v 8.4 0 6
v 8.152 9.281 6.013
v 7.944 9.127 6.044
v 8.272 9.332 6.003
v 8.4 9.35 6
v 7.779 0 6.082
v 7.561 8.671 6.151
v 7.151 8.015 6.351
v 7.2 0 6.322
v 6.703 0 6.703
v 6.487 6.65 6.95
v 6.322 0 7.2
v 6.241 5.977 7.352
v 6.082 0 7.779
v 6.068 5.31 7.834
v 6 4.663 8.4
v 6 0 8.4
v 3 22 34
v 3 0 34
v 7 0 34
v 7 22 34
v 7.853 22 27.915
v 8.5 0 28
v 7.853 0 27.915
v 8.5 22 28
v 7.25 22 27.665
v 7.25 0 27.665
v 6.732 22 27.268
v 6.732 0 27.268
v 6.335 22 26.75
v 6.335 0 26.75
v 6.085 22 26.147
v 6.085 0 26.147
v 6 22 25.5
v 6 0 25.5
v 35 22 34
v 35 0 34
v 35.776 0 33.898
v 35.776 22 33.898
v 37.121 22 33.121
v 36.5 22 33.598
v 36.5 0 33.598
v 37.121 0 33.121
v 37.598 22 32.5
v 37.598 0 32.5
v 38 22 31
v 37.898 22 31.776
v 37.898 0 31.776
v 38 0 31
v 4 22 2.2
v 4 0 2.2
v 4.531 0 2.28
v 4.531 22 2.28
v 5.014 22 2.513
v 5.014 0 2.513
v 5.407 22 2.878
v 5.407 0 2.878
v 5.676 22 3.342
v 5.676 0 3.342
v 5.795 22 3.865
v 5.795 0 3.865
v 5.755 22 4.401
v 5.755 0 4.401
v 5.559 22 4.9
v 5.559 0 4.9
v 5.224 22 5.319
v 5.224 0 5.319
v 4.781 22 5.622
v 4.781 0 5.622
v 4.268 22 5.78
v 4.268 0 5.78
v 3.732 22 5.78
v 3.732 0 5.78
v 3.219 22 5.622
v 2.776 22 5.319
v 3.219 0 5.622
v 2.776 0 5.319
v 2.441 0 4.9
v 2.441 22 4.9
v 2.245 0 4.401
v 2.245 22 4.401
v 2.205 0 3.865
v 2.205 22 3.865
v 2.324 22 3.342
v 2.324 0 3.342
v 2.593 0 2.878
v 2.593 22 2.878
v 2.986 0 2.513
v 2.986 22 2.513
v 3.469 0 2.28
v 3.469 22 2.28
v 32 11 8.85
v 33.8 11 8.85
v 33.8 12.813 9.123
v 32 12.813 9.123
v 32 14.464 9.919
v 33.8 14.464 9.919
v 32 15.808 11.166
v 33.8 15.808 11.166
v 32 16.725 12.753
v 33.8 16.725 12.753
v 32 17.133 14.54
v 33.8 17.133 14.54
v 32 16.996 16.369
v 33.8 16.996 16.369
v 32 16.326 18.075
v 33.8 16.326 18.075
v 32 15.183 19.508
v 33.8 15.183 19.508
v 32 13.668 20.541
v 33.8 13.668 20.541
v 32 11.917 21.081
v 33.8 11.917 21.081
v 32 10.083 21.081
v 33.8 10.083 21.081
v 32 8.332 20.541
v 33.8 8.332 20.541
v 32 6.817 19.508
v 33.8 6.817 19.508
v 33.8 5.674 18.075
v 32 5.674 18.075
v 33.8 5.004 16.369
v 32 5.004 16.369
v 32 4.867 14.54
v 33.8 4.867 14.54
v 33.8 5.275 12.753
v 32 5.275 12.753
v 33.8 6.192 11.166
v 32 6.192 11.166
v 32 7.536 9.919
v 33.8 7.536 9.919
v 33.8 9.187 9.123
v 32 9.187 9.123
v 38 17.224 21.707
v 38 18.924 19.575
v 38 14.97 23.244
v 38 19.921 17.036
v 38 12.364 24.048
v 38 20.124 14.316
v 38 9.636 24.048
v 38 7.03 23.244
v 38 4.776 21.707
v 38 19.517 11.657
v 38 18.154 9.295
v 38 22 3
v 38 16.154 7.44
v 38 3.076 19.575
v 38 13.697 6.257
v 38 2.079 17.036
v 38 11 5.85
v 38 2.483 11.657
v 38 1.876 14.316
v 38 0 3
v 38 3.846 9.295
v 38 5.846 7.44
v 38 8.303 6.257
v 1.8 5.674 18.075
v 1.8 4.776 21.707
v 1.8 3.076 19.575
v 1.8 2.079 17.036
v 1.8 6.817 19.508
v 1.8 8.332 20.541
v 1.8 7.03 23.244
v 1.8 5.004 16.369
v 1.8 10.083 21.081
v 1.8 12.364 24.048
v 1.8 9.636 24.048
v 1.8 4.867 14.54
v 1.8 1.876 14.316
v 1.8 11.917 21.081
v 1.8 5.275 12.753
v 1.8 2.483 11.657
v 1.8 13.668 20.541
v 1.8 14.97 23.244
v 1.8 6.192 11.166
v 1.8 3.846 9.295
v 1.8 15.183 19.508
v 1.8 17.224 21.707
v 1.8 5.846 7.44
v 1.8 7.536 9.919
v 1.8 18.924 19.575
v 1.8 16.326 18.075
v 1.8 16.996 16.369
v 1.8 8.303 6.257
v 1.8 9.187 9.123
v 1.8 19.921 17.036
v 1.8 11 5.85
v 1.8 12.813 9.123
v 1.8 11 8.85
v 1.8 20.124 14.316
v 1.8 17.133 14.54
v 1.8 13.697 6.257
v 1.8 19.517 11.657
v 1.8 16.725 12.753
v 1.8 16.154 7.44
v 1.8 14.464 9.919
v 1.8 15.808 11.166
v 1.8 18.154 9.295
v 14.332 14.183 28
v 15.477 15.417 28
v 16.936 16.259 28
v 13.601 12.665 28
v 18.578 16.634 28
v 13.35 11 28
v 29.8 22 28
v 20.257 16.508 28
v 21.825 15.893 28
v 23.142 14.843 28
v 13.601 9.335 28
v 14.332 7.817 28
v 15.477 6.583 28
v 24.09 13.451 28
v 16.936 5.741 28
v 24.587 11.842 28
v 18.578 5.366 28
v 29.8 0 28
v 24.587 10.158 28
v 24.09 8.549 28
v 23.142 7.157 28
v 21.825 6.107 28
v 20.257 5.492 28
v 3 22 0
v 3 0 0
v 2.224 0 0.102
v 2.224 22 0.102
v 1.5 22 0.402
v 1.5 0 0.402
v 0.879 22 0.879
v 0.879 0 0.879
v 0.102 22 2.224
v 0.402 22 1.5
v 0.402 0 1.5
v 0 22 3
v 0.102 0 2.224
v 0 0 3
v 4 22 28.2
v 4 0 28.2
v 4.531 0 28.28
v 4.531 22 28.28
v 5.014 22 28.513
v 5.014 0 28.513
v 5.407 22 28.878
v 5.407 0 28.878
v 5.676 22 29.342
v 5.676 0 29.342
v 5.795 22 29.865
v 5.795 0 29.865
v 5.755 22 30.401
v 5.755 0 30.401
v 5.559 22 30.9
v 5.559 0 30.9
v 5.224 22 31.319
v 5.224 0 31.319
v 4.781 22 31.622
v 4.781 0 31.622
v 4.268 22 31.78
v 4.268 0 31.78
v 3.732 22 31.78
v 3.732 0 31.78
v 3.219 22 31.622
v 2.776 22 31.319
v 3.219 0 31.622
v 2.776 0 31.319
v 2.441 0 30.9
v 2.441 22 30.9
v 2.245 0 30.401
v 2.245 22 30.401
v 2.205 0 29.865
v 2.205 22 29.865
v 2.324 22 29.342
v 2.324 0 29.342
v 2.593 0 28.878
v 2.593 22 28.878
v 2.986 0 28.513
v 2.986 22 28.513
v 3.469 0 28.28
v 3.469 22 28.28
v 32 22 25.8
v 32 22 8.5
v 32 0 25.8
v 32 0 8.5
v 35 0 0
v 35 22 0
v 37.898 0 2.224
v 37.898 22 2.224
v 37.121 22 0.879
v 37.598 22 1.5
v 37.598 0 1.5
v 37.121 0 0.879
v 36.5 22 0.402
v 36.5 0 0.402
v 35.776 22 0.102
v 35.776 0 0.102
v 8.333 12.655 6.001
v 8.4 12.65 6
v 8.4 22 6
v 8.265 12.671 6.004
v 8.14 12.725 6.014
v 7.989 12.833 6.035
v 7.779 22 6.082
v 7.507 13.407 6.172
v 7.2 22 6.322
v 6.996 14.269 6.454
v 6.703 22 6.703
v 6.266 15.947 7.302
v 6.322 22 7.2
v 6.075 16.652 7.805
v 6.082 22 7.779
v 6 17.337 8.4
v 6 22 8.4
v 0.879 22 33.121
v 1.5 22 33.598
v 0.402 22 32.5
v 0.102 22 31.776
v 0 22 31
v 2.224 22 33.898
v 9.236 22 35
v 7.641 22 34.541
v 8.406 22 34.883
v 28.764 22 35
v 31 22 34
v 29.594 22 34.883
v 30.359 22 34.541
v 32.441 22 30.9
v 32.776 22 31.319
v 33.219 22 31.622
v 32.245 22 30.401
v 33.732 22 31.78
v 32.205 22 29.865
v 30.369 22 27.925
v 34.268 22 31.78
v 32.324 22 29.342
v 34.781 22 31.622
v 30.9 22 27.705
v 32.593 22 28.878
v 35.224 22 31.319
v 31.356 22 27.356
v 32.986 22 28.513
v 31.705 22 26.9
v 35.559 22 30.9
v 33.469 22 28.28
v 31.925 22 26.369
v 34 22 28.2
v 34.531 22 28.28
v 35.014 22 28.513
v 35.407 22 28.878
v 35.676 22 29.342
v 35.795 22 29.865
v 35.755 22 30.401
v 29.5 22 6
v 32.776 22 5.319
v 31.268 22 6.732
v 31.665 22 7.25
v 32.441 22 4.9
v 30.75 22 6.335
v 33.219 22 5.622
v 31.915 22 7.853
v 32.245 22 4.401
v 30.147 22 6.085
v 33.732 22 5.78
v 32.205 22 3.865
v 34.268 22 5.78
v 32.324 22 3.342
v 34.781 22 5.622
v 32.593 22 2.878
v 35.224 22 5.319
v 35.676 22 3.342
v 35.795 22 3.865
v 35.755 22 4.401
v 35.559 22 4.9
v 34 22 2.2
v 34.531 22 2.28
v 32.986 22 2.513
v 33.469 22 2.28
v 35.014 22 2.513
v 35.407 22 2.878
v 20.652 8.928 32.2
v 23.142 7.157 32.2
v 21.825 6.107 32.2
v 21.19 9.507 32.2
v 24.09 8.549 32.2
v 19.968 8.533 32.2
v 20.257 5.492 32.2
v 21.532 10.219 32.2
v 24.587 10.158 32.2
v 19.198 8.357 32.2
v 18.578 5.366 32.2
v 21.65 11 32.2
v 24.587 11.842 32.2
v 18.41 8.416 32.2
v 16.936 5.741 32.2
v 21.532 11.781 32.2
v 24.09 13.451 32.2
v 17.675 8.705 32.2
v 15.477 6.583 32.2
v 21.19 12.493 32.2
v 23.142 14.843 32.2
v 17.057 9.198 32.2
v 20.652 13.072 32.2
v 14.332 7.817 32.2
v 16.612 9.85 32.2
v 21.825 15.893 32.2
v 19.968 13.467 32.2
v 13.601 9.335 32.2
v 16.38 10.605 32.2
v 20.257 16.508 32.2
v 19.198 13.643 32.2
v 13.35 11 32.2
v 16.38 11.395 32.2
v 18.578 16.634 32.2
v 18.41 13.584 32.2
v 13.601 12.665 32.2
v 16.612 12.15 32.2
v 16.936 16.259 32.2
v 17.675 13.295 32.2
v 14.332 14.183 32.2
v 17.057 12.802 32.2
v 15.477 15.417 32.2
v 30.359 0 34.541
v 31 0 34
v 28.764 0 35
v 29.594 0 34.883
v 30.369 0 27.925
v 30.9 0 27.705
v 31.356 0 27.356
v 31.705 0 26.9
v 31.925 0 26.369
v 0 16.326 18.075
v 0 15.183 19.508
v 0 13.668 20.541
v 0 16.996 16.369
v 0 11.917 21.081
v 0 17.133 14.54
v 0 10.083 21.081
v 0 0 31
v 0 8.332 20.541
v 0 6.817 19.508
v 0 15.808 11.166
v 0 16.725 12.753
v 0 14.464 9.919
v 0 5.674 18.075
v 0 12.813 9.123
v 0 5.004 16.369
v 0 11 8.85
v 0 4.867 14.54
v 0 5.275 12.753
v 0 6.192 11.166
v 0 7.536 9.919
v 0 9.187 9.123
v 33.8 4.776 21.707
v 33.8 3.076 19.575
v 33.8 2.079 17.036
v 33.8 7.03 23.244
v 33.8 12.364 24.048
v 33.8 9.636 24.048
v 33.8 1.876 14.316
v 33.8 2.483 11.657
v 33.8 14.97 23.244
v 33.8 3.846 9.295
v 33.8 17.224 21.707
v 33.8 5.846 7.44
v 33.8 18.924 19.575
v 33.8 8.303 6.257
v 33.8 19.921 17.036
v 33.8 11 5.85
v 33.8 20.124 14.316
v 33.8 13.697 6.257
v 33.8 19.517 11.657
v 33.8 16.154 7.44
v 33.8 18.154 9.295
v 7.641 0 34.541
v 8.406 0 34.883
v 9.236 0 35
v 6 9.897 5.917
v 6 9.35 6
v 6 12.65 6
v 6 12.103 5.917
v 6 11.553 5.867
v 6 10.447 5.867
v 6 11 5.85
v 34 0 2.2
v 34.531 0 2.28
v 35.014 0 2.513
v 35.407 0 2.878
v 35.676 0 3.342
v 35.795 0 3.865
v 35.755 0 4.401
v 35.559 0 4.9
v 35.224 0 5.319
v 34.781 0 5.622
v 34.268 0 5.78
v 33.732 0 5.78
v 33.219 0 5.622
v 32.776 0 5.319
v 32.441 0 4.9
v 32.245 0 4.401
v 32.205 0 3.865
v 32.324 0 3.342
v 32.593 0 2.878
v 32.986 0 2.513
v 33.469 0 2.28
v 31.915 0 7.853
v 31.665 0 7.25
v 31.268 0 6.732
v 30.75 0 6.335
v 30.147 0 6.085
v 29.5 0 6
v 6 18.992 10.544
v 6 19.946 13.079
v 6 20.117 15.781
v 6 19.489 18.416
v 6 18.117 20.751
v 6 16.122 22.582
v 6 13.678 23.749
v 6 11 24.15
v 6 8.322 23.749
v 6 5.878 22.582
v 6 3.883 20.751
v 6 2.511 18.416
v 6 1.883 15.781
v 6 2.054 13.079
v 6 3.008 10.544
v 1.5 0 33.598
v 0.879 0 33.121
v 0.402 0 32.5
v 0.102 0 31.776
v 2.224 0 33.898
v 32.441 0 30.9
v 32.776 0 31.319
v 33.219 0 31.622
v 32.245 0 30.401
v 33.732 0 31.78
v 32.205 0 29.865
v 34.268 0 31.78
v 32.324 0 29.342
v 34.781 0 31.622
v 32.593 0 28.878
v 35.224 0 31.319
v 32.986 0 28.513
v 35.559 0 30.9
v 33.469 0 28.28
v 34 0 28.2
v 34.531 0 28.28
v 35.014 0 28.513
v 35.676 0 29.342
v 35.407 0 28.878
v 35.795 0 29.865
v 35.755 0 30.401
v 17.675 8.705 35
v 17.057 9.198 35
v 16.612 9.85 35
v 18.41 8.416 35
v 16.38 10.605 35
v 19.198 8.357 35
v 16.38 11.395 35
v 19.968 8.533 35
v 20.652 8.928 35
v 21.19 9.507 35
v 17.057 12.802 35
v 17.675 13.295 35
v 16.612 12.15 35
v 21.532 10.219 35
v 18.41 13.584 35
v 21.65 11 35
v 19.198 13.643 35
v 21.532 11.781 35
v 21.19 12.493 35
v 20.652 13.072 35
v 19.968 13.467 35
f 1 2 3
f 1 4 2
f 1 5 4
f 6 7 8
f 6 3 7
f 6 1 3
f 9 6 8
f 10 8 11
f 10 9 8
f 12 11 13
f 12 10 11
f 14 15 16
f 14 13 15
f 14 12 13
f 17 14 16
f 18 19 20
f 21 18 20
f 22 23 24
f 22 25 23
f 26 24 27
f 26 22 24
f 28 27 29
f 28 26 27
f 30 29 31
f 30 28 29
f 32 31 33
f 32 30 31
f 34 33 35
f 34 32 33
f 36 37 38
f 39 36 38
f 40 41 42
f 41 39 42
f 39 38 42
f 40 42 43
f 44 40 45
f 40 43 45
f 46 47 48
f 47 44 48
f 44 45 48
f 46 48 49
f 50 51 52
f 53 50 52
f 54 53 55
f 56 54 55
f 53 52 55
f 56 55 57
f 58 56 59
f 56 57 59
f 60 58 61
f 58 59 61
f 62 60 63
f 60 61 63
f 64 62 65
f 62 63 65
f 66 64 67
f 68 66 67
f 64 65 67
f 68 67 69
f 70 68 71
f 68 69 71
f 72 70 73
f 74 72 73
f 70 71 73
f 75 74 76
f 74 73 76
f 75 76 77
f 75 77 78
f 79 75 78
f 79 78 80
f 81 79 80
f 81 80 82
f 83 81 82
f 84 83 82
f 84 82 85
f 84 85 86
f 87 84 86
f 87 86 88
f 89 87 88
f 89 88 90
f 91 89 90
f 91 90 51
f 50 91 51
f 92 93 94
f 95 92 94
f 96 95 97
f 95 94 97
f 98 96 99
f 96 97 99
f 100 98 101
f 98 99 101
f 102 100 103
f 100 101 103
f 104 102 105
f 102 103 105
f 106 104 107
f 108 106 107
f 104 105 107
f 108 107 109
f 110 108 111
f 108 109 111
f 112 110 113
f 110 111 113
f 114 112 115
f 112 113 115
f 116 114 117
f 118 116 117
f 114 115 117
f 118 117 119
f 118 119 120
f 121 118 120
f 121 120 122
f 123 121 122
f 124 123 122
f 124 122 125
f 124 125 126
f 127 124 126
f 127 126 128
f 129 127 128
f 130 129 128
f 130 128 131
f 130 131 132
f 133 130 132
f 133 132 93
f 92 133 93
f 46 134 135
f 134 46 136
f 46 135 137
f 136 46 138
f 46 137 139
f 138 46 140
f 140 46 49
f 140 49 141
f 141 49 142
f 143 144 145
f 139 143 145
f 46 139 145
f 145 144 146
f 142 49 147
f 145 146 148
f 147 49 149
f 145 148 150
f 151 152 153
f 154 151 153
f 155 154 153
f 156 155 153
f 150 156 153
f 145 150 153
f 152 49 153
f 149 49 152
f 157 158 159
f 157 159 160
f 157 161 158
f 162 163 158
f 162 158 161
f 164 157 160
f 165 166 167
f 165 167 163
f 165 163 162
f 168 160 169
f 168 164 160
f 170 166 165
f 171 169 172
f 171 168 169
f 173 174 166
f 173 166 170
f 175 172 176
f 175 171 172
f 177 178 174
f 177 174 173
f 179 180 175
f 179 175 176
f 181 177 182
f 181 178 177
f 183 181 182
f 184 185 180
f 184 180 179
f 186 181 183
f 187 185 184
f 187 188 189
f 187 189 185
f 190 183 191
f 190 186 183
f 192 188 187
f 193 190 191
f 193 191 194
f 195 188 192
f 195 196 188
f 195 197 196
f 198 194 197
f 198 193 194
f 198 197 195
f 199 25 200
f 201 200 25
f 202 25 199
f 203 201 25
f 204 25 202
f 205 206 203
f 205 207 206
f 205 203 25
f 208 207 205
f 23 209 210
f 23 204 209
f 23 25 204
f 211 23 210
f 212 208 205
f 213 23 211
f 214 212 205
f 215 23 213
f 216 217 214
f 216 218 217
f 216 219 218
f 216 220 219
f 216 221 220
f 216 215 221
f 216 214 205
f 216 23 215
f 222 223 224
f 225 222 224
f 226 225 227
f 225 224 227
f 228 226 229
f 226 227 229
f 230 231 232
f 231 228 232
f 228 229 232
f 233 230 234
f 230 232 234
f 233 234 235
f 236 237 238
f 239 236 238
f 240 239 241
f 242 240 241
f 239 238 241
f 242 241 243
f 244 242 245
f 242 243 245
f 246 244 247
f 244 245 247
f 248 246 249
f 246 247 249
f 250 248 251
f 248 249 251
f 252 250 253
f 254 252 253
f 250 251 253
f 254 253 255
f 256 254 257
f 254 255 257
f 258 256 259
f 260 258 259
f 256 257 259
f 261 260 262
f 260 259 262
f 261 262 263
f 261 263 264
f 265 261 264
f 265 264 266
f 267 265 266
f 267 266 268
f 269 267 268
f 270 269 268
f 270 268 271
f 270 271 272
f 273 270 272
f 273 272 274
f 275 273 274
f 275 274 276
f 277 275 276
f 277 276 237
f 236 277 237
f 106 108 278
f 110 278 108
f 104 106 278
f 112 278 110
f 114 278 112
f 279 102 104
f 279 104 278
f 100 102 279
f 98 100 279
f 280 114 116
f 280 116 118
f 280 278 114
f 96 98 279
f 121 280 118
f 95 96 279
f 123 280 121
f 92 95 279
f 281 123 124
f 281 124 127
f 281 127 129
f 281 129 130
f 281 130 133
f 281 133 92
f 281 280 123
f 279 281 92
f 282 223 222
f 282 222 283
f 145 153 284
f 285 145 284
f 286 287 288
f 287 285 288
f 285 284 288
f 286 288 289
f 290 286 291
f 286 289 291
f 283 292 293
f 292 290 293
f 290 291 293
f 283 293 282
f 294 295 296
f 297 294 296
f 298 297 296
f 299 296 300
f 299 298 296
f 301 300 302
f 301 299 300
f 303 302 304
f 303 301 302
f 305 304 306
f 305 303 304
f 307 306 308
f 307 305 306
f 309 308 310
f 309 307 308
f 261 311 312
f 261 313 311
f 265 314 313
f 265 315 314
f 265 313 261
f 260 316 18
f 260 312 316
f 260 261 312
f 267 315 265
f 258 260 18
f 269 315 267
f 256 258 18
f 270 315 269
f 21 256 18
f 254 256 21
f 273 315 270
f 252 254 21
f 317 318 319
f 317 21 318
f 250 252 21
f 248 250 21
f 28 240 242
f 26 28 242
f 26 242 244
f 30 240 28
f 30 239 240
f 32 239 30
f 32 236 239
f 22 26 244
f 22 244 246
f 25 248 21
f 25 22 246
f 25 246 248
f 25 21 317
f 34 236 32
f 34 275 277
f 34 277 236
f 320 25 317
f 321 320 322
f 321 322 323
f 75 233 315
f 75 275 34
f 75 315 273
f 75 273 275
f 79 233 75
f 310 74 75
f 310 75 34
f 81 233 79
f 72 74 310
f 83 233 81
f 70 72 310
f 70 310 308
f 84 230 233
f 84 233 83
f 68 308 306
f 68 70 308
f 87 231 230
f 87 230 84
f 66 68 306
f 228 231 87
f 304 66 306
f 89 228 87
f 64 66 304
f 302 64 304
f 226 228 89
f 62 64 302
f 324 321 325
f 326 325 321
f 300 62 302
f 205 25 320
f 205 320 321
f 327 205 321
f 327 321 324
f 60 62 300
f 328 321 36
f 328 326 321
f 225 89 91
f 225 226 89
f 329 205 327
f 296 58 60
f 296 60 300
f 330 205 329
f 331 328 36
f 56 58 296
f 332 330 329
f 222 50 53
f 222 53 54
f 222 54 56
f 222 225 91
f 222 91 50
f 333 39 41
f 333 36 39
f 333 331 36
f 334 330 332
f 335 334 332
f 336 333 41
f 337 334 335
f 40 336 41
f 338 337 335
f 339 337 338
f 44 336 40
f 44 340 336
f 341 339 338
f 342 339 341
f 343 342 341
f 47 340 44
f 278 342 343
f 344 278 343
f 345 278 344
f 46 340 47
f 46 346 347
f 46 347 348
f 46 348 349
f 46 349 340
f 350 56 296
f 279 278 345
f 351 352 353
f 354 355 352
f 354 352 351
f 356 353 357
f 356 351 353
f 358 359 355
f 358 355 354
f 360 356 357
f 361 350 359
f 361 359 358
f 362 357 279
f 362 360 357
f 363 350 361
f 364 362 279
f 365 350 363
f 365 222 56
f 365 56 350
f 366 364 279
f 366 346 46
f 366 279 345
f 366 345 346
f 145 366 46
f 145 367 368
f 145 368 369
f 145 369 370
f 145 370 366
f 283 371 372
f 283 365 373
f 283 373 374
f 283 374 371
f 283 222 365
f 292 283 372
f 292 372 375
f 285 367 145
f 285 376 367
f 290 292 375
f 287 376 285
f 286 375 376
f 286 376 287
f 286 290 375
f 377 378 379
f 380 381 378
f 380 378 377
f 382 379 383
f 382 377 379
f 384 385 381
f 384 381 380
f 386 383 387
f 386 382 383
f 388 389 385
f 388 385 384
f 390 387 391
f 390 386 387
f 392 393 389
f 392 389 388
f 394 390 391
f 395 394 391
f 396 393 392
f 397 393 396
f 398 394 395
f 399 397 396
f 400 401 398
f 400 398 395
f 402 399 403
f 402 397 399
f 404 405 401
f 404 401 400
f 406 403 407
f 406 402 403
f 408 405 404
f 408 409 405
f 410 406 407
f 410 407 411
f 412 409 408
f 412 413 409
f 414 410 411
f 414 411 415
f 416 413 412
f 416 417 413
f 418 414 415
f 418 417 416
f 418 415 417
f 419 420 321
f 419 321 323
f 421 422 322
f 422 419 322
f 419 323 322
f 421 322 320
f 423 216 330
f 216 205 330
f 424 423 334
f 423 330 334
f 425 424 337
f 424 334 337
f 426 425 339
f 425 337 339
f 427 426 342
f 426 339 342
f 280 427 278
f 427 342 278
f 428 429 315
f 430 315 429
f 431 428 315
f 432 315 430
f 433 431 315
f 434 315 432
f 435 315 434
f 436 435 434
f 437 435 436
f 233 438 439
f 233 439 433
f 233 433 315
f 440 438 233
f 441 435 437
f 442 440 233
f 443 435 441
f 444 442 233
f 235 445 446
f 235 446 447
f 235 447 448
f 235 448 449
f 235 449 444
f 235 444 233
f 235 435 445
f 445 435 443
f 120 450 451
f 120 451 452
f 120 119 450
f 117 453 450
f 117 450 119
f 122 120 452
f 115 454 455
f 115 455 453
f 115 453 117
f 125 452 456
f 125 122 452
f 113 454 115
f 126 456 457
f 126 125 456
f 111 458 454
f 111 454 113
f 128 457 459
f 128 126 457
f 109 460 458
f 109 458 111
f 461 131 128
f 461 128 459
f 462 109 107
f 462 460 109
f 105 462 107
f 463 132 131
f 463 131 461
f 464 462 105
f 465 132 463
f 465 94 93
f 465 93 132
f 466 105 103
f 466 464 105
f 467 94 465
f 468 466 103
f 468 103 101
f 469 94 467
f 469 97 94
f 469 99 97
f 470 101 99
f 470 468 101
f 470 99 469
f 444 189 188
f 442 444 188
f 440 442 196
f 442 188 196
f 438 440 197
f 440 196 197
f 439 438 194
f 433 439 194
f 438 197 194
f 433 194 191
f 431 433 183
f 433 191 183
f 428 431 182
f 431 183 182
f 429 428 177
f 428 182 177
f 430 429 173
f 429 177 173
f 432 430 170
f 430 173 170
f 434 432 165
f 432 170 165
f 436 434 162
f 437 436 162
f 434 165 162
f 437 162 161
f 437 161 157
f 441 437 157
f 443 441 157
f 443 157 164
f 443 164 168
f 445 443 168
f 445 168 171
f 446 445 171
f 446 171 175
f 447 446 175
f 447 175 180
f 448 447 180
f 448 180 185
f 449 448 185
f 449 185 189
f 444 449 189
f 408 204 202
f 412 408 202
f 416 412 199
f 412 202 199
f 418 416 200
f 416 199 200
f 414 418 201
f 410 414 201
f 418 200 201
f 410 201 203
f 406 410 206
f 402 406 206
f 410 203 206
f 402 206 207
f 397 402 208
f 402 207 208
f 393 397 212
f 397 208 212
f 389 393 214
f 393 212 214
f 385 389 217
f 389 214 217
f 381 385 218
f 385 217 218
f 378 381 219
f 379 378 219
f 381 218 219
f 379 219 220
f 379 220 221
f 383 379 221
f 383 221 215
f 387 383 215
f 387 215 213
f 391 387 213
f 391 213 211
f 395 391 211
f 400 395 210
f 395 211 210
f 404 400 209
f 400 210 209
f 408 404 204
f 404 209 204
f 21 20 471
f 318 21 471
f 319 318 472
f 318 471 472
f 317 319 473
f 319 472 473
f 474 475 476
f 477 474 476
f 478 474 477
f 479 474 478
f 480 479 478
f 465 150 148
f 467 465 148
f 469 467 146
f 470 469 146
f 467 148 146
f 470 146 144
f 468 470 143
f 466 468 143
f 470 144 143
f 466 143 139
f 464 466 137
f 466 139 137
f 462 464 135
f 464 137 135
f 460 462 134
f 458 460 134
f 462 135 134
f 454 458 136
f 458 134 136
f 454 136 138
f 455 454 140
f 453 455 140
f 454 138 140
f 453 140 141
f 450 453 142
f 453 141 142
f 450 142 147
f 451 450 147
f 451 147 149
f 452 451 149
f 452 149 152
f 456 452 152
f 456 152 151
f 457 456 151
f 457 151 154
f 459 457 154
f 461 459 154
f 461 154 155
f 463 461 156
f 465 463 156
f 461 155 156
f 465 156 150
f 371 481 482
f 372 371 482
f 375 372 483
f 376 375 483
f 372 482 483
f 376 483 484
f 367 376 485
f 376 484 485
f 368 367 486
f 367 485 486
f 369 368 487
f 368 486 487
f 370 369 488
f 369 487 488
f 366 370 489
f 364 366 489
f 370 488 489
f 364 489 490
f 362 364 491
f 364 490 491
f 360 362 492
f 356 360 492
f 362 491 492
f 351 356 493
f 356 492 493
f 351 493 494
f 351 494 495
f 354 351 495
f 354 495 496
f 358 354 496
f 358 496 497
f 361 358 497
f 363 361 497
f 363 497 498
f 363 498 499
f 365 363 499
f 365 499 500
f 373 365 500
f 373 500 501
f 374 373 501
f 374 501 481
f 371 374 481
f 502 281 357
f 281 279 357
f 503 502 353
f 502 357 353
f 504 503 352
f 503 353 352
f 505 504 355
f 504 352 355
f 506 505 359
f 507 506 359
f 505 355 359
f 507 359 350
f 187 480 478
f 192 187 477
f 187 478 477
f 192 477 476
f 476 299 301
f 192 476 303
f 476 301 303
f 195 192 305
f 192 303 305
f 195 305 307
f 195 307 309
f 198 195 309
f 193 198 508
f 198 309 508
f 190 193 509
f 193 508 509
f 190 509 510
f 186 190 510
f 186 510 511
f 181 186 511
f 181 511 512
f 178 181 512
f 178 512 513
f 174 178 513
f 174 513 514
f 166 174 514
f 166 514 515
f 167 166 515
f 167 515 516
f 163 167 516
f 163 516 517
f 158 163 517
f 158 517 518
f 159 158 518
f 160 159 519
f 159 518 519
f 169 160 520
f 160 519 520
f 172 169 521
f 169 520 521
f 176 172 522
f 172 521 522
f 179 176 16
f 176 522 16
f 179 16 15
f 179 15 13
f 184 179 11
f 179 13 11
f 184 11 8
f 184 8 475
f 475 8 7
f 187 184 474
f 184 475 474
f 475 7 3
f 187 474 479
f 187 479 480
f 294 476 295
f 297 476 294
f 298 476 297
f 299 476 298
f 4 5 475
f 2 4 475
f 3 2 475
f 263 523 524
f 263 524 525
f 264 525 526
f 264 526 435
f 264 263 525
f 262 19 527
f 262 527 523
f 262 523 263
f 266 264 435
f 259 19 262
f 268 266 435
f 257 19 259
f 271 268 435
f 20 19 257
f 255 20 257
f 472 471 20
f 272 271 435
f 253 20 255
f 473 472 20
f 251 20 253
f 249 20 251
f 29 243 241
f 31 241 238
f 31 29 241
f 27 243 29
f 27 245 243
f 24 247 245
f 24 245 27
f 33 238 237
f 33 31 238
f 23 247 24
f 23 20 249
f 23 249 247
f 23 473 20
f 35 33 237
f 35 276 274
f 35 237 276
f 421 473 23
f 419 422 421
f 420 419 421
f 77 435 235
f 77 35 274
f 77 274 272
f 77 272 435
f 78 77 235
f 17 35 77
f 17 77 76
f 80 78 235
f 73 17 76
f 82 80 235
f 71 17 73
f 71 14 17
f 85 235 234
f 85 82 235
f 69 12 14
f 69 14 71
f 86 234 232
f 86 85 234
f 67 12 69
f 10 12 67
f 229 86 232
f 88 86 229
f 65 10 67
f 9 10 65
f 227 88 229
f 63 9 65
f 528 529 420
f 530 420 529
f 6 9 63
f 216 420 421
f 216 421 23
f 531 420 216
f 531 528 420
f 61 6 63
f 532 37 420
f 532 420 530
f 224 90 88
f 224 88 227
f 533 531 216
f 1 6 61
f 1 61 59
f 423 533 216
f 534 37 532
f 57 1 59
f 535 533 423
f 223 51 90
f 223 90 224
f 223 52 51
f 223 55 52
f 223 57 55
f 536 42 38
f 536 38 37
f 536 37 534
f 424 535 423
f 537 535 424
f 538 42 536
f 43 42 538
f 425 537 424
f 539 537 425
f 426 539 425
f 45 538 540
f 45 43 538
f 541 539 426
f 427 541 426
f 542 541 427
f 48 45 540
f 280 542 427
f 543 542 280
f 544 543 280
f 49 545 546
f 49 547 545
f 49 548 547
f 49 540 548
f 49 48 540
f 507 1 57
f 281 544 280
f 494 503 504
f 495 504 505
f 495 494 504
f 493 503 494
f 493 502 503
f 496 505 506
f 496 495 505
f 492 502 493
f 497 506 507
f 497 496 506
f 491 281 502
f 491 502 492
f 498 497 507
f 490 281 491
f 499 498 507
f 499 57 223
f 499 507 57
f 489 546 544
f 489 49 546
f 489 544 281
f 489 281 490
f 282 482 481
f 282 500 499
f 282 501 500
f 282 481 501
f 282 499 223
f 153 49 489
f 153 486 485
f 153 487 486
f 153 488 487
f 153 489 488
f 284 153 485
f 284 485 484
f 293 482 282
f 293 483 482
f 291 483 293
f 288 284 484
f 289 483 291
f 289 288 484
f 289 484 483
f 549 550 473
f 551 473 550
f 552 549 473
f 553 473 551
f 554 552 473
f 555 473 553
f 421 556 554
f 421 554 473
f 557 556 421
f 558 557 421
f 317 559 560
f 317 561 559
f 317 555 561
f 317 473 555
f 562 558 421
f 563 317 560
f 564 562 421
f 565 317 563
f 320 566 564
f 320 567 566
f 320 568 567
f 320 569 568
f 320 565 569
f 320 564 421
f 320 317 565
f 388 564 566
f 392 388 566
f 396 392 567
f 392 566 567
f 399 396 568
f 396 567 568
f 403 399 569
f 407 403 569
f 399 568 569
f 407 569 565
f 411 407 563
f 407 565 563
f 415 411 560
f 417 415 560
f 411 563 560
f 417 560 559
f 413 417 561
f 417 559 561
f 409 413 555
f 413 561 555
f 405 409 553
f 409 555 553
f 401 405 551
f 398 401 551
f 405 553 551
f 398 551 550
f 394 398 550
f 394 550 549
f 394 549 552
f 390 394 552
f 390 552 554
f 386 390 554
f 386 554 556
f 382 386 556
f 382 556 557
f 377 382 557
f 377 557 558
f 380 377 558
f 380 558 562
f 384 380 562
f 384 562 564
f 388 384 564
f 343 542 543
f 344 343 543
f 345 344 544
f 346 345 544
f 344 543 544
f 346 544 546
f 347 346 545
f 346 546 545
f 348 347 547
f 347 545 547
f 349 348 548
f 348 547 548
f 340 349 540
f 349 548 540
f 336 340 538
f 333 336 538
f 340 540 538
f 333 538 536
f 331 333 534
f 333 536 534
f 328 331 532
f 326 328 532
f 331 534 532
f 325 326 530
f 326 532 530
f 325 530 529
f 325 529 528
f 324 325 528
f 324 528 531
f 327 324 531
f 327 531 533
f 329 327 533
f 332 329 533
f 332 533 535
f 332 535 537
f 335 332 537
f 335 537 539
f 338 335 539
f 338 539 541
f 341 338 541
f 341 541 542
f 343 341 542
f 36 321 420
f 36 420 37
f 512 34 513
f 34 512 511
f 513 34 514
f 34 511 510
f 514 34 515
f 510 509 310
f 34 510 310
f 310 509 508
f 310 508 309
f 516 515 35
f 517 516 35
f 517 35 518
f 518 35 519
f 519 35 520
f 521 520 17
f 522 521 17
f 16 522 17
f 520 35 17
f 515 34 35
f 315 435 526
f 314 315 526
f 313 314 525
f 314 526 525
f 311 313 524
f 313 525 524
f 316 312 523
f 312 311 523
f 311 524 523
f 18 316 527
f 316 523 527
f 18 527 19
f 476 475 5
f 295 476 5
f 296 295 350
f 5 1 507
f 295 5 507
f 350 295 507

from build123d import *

# Parameters (mm, degrees)
SKETCH3_W           = 38
SKETCH3_H           = 34
SKETCH3_W_2         = 26
SKETCH3_H_2         = 22
BOSS_EXTRUDE1_DEPTH = 22
SKETCH4_W           = 24
SKETCH4_H           = 22
BOSS_EXTRUDE2_DEPTH = 1
SKETCH5_R           = 2.65
CUT_EXTRUDE1_DEPTH  = 12
SKETCH7_R           = 5.65
CUT_EXTRUDE3_DEPTH  = 4.2
SKETCH8_R           = 6.15
CUT_EXTRUDE4_DEPTH  = 57.151580565
SKETCH9_R           = 9.15
CUT_EXTRUDE5_DEPTH  = 4.2
SKETCH10_R          = 9.15
CUT_EXTRUDE6_DEPTH  = 4.2
SKETCH15_R          = 1.8
CUT_EXTRUDE7_DEPTH  = 57.151580565
FILLET1_R           = 3
FILLET3_R           = 2.5
FILLET4_R           = 2.2
FILLET5_R           = 2.4


with BuildPart() as part:
    # Sketch3 → Boss-Extrude1 (new body)
    with BuildSketch(Plane(origin=(0, 0, 0), x_dir=(1, 0, 0), z_dir=(0, 1, 0))):
        with Locations((19, -17)):
            Rectangle(SKETCH3_W, SKETCH3_H)
        with Locations((19, -17)):
            Rectangle(SKETCH3_W_2, SKETCH3_H_2, mode=Mode.SUBTRACT)
    extrude(amount=BOSS_EXTRUDE1_DEPTH)

    # Sketch4 → Boss-Extrude2 (add)
    with BuildSketch(Plane.XY.offset(34)):
        with Locations((19, 11)):
            Rectangle(SKETCH4_W, SKETCH4_H)
    extrude(amount=BOSS_EXTRUDE2_DEPTH)

    # Sketch5 → Cut-Extrude1 (cut)
    with BuildSketch(Plane.XY.offset(35)):
        with Locations((19, 11)):
            Circle(SKETCH5_R)
    extrude(amount=-CUT_EXTRUDE1_DEPTH, mode=Mode.SUBTRACT)

    # Sketch7 → Cut-Extrude3 (cut)
    with BuildSketch(Plane(origin=(0, 0, 28), x_dir=(-1, 0, 0), z_dir=(0, 0, -1))):
        with Locations((-19, 11)):
            Circle(SKETCH7_R)
    extrude(amount=-CUT_EXTRUDE3_DEPTH, mode=Mode.SUBTRACT)

    # Sketch8 → Cut-Extrude4 (cut, through all)
    with BuildSketch(Plane(origin=(38, 0, 0), x_dir=(0, 0, -1), z_dir=(1, 0, 0))):
        with Locations((-15, 11)):
            Circle(SKETCH8_R)
    extrude(amount=-CUT_EXTRUDE4_DEPTH, mode=Mode.SUBTRACT)

    # Sketch9 → Cut-Extrude5 (cut)
    with BuildSketch(Plane(origin=(6, 0, 0), x_dir=(0, 0, -1), z_dir=(1, 0, 0))):
        with Locations((-15, 11)):
            Circle(SKETCH9_R)
    extrude(amount=-CUT_EXTRUDE5_DEPTH, mode=Mode.SUBTRACT)

    # Sketch10 → Cut-Extrude6 (cut)
    with BuildSketch(Plane(origin=(38, 0, 0), x_dir=(0, 0, -1), z_dir=(1, 0, 0))):
        with Locations((-15, 11)):
            Circle(SKETCH10_R)
    extrude(amount=-CUT_EXTRUDE6_DEPTH, mode=Mode.SUBTRACT)

    # Sketch15 → Cut-Extrude7 (cut, through all)
    with BuildSketch(Plane(origin=(0, 0, 0), x_dir=(-1, 0, 0), z_dir=(0, -1, 0))):
        with Locations(Location((-4, -30, 0), (0, 0, 90))):
            Circle(SKETCH15_R)
        with Locations(Location((-34, -30, 0), (0, 0, 90))):
            Circle(SKETCH15_R)
        with Locations(Location((-34, -4, 0), (0, 0, 90))):
            Circle(SKETCH15_R)
        with Locations(Location((-4, -4, 0), (0, 0, 90))):
            Circle(SKETCH15_R)
    extrude(amount=-CUT_EXTRUDE7_DEPTH, mode=Mode.SUBTRACT)

    # Fillet1
    # the kernel refuses this fillet: 3 mm, written as the material it takes off along each edge
    with BuildSketch(Plane(origin=(38, -7.5, 0), x_dir=(-1, 0, 0), z_dir=(0, 1, 0)), Plane(origin=(38, -7.5, 34), x_dir=(0, 0, -1), z_dir=(0, 1, 0))) as fillet1_piece_1:
        with BuildLine():
            CenterArc((FILLET1_R, FILLET1_R), FILLET1_R, 180, 90)
            Line((0, FILLET1_R), (-FILLET1_R * 0.02, FILLET1_R))
            Line((-FILLET1_R * 0.02, FILLET1_R), (-FILLET1_R * 0.02, -FILLET1_R * 0.02))
            Line((-FILLET1_R * 0.02, -FILLET1_R * 0.02), (FILLET1_R, -FILLET1_R * 0.02))
            Line((FILLET1_R, -FILLET1_R * 0.02), (FILLET1_R, 0))
        make_face()
    extrude(amount=37, mode=Mode.SUBTRACT)
    with BuildSketch(Plane(origin=(7, -5.590169944, 35), x_dir=(0, 0, -1), z_dir=(0, 1, 0)), Plane(origin=(31, 27.590169944, 35), x_dir=(0, 0, -1), z_dir=(0, -1, 0))) as fillet1_piece_2:
        with BuildLine():
            CenterArc((3, -2.236067977), FILLET1_R, 131.810314896, 48.189685104)
            Line((0, -2.236067977), (-0.06, -2.236067977))
            Line((-0.06, -2.236067977), (-0.06, 0))
            Line((-0.06, 0), (0, 0.06))
            ThreePointArc((0, 0.06), (0.5, 0.06), (0.96, 0.04472136))
            Line((0.96, 0.04472136), (1, 0))
        make_face()
    extrude(amount=33.180339887, mode=Mode.SUBTRACT)
    with BuildSketch(Plane(origin=(0, -7.5, 34), x_dir=(0, 0, -1), z_dir=(0, 1, 0)), Plane(origin=(0, -7.5, 0), x_dir=(1, 0, 0), z_dir=(0, 1, 0))) as fillet1_piece_3:
        with BuildLine():
            CenterArc((FILLET1_R, -FILLET1_R), FILLET1_R, 90, 90)
            Line((0, -FILLET1_R), (-FILLET1_R * 0.02, -FILLET1_R))
            Line((-FILLET1_R * 0.02, -FILLET1_R), (-FILLET1_R * 0.02, FILLET1_R * 0.02))
            Line((-FILLET1_R * 0.02, FILLET1_R * 0.02), (FILLET1_R, FILLET1_R * 0.02))
            Line((FILLET1_R, FILLET1_R * 0.02), (FILLET1_R, 0))
        make_face()
    extrude(amount=37, mode=Mode.SUBTRACT)

    # Fillet3
    fillet3_edges = [part.edges().sort_by_distance(p)[0] for p in [
        (6, 11, 28),
        (32, 11, 6),
    ]]
    fillet(fillet3_edges, radius=FILLET3_R)

    # Fillet4
    fillet4_edges = [part.edges().sort_by_distance(p)[0] for p in [
        (32, 11, 28),
    ]]
    fillet(fillet4_edges, radius=FILLET4_R)

    # Fillet5
    # the kernel refuses this fillet: 2.4 mm, written as the material it adds along each edge
    with BuildSketch(Plane(origin=(6, 6.65, 6), x_dir=(0, 0, 1), z_dir=(0, 1, 0))) as fillet5_piece_1_section:
        with BuildLine():
            CenterArc((FILLET5_R, FILLET5_R), FILLET5_R, 180, 90)
            Line((0, FILLET5_R), (0, 0))
            Line((0, 0), (FILLET5_R, 0))
        make_face()
    fillet5_piece_1 = extrude(amount=15.35, mode=Mode.PRIVATE)
    fillet5_piece_1 = fillet5_piece_1 - Plane(origin=(6.746267067, 11, 15), x_dir=(0, 0, -1), z_dir=(1, 0, 0)) * Cylinder(9.15, 41, mode=Mode.PRIVATE)
    add(fillet5_piece_1)
    with BuildSketch(Plane(origin=(6, 0, 6), x_dir=(0, 0, 1), z_dir=(0, 1, 0))) as fillet5_piece_2_section:
        with BuildLine():
            CenterArc((FILLET5_R, FILLET5_R), FILLET5_R, 180, 90)
            Line((0, FILLET5_R), (0, 0))
            Line((0, 0), (FILLET5_R, 0))
        make_face()
    fillet5_piece_2 = extrude(amount=15.35, mode=Mode.PRIVATE)
    fillet5_piece_2 = fillet5_piece_2 - Plane(origin=(6.573929996, 11, 15), x_dir=(0, 0, -1), z_dir=(1, 0, 0)) * Cylinder(9.15, 41, mode=Mode.PRIVATE)
    add(fillet5_piece_2)


solid = part.part
